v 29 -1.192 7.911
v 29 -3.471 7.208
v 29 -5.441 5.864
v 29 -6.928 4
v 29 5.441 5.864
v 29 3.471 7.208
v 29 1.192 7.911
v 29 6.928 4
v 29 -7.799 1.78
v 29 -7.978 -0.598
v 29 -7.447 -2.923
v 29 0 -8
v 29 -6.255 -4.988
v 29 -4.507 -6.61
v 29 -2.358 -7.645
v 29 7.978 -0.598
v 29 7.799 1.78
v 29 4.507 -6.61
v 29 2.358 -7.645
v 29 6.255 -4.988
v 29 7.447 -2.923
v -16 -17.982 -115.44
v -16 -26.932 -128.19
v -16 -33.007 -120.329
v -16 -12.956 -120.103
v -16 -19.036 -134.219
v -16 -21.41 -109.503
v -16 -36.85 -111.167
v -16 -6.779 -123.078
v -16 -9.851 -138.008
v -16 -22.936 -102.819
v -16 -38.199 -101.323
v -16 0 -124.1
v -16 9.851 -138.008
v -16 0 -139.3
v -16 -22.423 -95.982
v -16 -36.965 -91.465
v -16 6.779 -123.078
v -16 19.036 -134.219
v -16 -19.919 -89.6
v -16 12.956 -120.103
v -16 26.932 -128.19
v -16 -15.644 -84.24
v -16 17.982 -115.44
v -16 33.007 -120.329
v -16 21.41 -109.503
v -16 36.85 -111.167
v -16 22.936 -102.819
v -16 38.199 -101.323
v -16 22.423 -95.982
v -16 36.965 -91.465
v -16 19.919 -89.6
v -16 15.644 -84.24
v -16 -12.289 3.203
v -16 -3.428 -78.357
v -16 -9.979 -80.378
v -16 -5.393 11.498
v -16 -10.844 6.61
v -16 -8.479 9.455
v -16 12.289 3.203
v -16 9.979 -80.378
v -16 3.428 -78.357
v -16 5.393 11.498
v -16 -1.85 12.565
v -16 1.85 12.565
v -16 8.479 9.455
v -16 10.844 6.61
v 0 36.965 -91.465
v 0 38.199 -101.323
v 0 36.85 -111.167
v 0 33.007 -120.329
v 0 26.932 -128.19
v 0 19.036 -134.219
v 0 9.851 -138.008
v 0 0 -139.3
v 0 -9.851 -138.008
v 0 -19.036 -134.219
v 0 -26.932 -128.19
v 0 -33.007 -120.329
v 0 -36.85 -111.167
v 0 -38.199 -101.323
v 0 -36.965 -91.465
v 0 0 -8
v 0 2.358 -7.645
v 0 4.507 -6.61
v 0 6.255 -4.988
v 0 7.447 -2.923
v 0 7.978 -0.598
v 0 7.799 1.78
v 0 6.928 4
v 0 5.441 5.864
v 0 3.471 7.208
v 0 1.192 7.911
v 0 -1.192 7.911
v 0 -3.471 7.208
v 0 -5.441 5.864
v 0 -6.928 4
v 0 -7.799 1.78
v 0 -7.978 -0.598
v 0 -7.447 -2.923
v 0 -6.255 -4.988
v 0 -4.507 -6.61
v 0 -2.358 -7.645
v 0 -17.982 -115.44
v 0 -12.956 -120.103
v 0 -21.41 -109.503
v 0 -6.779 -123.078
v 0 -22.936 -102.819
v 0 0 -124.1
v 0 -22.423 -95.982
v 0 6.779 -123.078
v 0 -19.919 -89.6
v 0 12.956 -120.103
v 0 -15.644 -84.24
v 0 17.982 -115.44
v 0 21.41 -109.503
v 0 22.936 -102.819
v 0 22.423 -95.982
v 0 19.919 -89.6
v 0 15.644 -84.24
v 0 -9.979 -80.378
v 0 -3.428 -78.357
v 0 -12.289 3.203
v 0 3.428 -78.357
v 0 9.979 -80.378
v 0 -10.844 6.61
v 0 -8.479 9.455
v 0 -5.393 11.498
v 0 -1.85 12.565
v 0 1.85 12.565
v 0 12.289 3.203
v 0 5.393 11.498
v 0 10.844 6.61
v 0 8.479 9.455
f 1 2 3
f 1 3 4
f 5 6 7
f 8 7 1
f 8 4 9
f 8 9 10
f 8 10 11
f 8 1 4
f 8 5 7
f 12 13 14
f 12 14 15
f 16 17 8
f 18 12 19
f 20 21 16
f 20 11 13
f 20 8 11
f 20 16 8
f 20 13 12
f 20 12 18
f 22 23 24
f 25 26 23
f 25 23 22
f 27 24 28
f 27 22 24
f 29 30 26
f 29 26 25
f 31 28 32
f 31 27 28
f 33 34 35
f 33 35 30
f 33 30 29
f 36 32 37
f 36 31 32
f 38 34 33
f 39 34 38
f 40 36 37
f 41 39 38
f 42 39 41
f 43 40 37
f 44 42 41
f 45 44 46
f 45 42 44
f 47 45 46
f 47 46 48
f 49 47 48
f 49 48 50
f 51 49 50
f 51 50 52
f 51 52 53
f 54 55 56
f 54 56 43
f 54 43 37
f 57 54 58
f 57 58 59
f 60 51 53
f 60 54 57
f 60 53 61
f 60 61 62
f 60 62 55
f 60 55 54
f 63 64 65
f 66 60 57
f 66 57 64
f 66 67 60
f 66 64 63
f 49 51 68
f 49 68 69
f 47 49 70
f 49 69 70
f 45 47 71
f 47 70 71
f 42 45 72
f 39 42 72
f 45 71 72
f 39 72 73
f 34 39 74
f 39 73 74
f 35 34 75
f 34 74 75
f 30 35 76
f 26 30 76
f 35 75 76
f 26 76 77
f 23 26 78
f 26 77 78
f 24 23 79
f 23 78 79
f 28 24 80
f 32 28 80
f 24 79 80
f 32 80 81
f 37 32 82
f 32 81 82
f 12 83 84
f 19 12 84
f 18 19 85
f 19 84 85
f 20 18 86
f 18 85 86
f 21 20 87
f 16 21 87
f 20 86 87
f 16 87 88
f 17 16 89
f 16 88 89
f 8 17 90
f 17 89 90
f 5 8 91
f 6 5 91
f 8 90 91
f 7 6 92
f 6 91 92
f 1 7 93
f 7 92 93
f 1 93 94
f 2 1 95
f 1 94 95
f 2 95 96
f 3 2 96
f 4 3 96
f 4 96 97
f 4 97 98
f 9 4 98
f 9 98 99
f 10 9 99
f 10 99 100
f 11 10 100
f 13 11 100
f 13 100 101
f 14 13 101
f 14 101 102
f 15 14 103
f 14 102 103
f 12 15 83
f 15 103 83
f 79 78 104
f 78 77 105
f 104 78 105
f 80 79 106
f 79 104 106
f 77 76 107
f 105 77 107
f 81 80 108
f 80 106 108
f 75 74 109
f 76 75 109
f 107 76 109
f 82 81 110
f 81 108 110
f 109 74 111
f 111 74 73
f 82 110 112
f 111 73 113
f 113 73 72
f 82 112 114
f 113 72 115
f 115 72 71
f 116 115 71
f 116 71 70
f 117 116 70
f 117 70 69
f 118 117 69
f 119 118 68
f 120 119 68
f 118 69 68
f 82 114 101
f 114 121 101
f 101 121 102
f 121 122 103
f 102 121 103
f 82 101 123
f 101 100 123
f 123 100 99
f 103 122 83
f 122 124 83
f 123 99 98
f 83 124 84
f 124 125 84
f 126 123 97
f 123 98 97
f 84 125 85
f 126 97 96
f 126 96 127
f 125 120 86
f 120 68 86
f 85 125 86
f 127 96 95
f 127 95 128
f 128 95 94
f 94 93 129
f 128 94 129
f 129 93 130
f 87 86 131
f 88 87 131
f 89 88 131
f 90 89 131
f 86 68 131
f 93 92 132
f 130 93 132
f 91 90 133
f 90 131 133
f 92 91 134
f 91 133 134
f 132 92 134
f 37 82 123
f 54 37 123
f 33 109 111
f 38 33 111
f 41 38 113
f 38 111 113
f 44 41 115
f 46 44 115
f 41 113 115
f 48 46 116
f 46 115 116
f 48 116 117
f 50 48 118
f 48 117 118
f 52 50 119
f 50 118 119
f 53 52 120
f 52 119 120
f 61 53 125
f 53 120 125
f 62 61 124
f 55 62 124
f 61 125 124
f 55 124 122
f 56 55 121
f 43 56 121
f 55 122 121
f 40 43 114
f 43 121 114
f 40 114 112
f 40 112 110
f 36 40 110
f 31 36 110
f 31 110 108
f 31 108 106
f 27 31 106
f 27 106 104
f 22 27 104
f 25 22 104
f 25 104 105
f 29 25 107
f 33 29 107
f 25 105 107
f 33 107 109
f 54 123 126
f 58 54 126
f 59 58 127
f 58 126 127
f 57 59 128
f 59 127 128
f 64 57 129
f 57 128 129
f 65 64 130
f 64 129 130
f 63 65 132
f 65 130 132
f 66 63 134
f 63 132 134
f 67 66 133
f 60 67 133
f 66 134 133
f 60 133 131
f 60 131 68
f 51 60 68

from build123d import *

# Parameters (mm, degrees)
BOSS_EXTRUDE1_DEPTH = 16
SKETCH2_R           = 8
BOSS_EXTRUDE2_DEPTH = 29
SKETCH3_R           = 23
CUT_EXTRUDE1_DEPTH  = 16


with BuildPart() as part:
    # Sketch1 → Boss-Extrude1 (new body)
    with BuildSketch(Plane(origin=(0, 0, 0), x_dir=(0, 0, -1), z_dir=(1, 0, 0))):
        with BuildLine():
            Line((-3.203264095, 12.289389698), (91.464985163, 36.964935941))
            ThreePointArc((91.464985163, 36.964935941), (139.3, 0), (91.464985163, -36.964935941))
            Line((91.464985163, -36.964935941), (-3.203264095, -12.289389698))
            ThreePointArc((-3.203264095, -12.289389698), (-12.7, 0), (-3.203264095, 12.289389698))
        make_face()
    extrude(amount=-BOSS_EXTRUDE1_DEPTH)

    # Sketch2 → Boss-Extrude2 (add)
    with BuildSketch(Plane(origin=(0, 0, 0), x_dir=(0, 0, -1), z_dir=(1, 0, 0))):
        Circle(SKETCH2_R)
    extrude(amount=BOSS_EXTRUDE2_DEPTH)

    # Sketch3 → Cut-Extrude1 (cut)
    with BuildSketch(Plane(origin=(0, 0, 0), x_dir=(0, 0, -1), z_dir=(1, 0, 0))):
        with Locations((101.1, 0)):
            Circle(SKETCH3_R)
    extrude(amount=-CUT_EXTRUDE1_DEPTH, mode=Mode.SUBTRACT)


solid = part.part
